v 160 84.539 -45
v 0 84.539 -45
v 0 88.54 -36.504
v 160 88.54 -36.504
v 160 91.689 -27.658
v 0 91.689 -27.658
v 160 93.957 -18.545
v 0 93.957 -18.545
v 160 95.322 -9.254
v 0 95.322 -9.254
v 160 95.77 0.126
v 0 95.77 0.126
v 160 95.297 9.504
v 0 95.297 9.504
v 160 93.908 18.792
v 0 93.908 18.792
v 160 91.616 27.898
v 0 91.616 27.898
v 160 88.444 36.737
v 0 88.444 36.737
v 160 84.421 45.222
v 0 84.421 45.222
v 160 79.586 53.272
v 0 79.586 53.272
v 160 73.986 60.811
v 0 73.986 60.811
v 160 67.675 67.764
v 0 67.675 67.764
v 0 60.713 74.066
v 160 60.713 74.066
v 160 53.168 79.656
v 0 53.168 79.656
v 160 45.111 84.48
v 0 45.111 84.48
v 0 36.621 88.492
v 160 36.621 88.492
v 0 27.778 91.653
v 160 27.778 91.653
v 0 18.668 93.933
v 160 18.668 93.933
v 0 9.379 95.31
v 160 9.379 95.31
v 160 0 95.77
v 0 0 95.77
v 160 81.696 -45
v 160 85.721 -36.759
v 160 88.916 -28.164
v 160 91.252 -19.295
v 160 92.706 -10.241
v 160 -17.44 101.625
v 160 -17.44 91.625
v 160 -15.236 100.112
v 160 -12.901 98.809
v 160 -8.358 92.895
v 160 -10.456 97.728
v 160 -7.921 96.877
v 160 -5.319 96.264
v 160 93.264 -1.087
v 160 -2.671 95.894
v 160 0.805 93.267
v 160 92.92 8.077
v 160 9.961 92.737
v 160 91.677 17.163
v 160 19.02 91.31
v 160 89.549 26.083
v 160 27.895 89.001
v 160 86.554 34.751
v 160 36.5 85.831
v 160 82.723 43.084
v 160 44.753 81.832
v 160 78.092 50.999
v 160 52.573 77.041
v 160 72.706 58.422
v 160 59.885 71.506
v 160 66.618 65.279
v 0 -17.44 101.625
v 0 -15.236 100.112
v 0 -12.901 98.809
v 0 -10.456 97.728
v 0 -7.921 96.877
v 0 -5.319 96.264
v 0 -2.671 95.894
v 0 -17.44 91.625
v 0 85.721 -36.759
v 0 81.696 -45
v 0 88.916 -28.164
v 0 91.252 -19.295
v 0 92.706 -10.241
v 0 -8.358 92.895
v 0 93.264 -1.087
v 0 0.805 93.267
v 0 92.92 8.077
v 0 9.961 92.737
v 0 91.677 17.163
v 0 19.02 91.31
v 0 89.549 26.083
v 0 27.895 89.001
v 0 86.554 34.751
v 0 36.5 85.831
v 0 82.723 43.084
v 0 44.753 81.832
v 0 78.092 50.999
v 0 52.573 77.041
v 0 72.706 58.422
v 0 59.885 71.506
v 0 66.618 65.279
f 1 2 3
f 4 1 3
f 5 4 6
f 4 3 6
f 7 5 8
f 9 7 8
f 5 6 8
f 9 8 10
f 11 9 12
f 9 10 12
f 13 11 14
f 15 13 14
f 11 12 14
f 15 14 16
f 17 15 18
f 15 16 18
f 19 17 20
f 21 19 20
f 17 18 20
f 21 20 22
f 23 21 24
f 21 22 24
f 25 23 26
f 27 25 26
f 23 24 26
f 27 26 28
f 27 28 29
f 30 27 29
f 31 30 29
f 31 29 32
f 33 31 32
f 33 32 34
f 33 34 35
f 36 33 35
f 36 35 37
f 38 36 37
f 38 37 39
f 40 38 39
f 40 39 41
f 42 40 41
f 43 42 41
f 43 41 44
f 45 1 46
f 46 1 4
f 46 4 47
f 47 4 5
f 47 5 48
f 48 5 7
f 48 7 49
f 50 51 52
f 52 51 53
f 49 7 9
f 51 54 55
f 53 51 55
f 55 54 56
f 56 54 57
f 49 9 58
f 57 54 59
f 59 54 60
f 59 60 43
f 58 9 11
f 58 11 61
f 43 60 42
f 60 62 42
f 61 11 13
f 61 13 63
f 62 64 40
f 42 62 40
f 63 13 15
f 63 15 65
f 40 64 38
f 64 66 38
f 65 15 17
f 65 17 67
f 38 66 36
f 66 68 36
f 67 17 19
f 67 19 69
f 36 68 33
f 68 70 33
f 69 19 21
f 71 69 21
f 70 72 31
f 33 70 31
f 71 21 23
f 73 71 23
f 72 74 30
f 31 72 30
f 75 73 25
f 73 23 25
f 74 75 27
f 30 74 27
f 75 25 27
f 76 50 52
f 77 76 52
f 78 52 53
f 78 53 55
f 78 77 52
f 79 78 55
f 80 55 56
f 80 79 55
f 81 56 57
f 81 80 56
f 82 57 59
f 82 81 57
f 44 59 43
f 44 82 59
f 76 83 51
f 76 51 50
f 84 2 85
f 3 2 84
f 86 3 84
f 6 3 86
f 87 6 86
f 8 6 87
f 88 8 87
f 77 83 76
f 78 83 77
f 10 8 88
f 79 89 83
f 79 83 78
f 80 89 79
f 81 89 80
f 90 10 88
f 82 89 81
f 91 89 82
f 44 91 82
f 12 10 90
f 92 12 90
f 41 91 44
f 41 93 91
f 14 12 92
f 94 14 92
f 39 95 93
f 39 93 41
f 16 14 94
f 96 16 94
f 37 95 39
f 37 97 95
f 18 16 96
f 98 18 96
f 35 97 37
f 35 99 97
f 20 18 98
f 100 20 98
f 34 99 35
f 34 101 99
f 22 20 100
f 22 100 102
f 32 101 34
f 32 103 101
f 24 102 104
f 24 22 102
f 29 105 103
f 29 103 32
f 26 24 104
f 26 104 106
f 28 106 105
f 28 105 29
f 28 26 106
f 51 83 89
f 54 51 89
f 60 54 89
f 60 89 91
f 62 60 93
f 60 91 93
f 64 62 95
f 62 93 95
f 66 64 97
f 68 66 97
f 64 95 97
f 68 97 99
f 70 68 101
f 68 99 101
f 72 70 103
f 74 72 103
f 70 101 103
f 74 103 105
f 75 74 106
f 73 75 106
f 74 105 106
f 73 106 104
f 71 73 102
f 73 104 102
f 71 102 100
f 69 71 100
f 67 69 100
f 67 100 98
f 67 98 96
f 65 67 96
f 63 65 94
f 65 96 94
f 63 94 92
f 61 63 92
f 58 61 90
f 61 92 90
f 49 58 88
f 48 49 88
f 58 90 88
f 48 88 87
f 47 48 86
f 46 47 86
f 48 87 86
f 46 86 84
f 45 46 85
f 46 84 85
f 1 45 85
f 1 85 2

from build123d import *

# Parameters (mm, degrees)
SALIENTE_EXTRUIR1_DEPTH = 160
SALIENTE_EXTRUIR3_START = -160
SALIENTE_EXTRUIR3_DEPTH = 160


with BuildPart() as part:
    # Croquis1 → Saliente-Extruir1 (new body)
    with BuildSketch(Plane(origin=(0, 0, 0), x_dir=(0, 0, -1), z_dir=(1, 0, 0))):
        with BuildLine():
            ThreePointArc((45, 84.539297963), (-56.606836573, 77.249977043), (-94.168674728, -17.44))
            Line((-94.168674728, -17.44), (-91.624992769, -17.44))
            ThreePointArc((-91.624992769, -17.44), (-54.7766031, 75.490507038), (45, 81.696345696))
            Line((45, 81.696345696), (45, 84.539297963))
        make_face()
    extrude(amount=SALIENTE_EXTRUIR1_DEPTH)

    # Croquis2 → Saliente-Extruir3 (add)
    with BuildSketch(Plane(origin=(160, 0, 0), x_dir=(0, 0, -1), z_dir=(1, 0, 0)).offset(SALIENTE_EXTRUIR3_START)):
        with BuildLine():
            Line((-94.168674728, -17.44), (-101.624992769, -17.44))
            ThreePointArc((-101.624992769, -17.44), (-97.2728202, -9.198295227), (-95.77, 0))
            ThreePointArc((-95.77, 0), (-95.368828447, -8.756680916), (-94.168674728, -17.44))
        make_face()
    extrude(amount=SALIENTE_EXTRUIR3_DEPTH)


solid = part.part
